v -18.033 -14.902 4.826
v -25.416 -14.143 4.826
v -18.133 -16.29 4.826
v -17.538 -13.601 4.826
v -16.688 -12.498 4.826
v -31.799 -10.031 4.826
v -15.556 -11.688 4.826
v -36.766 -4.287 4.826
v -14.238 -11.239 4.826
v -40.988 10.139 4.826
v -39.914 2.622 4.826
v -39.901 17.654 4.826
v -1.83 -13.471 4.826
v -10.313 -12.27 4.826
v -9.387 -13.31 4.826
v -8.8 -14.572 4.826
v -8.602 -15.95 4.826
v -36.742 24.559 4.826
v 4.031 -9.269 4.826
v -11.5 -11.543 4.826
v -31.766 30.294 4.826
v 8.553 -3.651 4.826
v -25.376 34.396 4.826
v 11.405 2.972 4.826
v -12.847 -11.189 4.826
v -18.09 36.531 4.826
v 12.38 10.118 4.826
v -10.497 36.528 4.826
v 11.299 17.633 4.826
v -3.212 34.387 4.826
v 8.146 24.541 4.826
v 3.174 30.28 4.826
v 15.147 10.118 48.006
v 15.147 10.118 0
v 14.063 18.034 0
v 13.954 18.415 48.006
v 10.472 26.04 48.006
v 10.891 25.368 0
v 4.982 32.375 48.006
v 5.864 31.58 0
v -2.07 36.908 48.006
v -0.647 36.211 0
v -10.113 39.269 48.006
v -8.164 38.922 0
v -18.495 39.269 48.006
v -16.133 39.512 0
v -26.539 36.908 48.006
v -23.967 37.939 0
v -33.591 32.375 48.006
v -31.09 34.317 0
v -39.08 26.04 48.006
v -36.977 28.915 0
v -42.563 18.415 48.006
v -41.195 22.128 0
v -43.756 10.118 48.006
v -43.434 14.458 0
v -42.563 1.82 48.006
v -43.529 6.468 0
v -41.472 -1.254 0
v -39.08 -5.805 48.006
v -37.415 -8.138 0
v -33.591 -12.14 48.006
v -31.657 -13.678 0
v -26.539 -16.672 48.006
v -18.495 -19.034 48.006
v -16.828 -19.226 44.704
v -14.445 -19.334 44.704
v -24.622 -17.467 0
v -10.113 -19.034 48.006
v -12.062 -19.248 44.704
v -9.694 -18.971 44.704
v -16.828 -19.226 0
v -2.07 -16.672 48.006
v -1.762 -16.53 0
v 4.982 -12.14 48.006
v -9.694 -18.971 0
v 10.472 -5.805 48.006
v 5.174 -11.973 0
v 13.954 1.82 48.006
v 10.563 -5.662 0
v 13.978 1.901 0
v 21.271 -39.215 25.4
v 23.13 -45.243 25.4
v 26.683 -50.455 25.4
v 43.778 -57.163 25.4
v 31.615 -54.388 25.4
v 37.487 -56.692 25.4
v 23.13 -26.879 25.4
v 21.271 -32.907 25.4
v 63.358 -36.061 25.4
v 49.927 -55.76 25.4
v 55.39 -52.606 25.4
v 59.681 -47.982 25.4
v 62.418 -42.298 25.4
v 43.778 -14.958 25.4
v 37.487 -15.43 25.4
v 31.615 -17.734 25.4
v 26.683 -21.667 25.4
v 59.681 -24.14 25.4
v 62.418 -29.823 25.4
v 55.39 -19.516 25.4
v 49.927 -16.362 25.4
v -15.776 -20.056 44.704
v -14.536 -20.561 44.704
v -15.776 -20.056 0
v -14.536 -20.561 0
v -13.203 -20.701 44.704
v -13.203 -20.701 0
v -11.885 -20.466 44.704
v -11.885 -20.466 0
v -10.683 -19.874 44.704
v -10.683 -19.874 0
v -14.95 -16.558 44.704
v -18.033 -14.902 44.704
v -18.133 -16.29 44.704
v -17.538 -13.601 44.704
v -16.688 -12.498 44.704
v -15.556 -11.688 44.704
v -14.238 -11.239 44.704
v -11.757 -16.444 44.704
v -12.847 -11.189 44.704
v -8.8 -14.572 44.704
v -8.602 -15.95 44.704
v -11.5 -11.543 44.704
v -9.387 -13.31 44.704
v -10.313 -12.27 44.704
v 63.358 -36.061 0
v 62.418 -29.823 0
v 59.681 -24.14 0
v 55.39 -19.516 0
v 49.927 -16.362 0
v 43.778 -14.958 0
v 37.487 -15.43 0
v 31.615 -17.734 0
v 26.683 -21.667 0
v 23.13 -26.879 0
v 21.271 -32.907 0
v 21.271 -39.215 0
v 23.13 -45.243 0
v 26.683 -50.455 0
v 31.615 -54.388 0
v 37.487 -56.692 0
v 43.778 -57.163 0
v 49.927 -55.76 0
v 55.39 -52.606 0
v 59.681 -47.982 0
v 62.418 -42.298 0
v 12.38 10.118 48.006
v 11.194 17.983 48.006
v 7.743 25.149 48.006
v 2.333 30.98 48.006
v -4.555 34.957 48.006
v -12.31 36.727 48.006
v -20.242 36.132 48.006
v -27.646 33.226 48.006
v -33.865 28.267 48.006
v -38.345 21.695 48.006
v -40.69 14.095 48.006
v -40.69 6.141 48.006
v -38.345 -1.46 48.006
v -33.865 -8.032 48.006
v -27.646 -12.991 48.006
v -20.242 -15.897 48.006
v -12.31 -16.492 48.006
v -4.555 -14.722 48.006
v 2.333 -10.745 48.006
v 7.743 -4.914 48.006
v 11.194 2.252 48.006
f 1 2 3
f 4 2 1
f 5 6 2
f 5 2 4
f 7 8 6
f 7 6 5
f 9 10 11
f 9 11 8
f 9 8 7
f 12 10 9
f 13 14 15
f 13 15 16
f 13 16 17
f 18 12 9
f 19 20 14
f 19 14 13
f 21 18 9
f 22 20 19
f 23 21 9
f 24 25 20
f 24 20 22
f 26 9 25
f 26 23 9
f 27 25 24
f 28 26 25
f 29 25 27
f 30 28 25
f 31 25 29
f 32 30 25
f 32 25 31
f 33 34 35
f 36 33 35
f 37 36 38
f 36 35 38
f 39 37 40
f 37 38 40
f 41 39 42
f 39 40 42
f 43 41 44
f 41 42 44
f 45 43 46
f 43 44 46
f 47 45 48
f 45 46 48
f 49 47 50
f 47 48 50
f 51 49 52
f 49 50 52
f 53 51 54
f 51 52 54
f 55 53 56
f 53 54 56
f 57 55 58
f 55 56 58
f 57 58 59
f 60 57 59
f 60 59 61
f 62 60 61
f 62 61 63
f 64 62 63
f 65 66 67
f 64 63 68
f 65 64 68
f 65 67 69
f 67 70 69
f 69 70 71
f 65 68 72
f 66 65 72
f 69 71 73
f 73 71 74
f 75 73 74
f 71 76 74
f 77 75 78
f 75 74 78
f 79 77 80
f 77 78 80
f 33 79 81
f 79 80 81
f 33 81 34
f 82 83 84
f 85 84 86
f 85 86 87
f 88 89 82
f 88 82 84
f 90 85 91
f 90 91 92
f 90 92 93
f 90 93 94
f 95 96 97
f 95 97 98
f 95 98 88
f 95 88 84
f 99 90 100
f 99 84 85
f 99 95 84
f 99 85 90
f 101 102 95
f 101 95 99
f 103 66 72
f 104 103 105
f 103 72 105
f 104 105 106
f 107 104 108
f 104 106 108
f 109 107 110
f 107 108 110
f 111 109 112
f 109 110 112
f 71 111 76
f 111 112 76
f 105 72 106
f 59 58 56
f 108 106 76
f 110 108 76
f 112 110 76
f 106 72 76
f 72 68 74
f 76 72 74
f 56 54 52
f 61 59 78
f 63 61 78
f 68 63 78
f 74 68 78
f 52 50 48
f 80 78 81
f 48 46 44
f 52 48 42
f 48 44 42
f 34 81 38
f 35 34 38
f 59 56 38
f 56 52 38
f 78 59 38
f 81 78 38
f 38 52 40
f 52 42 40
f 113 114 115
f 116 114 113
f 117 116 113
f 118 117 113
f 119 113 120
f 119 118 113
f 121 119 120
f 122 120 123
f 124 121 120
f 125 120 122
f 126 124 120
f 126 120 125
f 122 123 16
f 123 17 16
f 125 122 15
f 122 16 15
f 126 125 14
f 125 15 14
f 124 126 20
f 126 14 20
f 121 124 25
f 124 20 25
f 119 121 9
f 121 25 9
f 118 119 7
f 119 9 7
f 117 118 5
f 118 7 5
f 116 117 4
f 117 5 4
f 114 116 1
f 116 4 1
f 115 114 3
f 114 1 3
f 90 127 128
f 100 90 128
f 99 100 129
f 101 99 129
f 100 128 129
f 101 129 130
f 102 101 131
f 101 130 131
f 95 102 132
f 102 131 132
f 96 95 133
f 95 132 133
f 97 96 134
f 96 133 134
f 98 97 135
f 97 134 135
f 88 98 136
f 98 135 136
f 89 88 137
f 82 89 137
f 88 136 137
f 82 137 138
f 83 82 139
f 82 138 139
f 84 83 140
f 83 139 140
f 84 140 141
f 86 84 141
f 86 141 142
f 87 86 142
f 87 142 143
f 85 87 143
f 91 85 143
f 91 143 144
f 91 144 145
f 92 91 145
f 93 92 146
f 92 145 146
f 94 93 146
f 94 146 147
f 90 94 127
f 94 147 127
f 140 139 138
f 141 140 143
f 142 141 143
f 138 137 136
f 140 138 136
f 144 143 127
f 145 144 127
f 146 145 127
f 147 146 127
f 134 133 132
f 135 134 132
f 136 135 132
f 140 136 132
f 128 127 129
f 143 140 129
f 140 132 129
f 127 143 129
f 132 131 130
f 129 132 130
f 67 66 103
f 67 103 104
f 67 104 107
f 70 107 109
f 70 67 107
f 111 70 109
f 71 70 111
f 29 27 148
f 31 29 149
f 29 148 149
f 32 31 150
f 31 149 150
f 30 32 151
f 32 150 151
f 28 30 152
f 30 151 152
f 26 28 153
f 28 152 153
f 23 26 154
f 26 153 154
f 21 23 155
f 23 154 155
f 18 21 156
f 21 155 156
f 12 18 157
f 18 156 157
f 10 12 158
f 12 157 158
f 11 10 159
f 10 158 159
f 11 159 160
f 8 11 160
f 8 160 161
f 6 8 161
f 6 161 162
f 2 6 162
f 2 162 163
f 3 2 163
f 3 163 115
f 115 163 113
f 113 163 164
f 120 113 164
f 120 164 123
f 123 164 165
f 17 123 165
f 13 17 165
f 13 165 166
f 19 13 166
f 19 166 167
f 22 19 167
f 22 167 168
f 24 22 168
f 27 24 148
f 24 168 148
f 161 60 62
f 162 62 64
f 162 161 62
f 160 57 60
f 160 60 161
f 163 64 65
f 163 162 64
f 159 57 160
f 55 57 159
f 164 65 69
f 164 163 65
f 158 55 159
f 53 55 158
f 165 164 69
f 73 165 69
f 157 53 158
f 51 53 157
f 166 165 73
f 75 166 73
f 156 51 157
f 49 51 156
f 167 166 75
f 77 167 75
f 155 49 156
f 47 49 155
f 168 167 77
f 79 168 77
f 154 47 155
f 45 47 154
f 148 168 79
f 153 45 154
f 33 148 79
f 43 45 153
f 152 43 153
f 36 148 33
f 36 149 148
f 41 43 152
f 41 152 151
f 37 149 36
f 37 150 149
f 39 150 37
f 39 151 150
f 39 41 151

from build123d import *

# Parameters (mm, degrees)
F0_R      = 29.451456
F1_DEPTH  = 48.006
F2_R      = 26.683746
F3_DEPTH  = 43.18
F5_R      = 4.77229
F6_DEPTH  = 44.704
F4_R      = 21.661849
F7_DEPTH  = 25.4
F8_R      = 56.122028
F9_DEPTH  = 44.45
F10_R     = 21.161819
F11_DEPTH = 25.4


with BuildPart() as f1:
    # F0 (on Top) → F1 (new body)
    with BuildSketch(Plane.XY):
        with Locations((-14.304114, 10.117544)):
            Circle(F0_R)
    extrude(amount=F1_DEPTH)

    # F2 (on face) → F3 (cut)
    with BuildSketch(Plane.XY.offset(48.006)):
        with Locations((-14.304114, 10.117544)):
            Circle(F2_R)
    extrude(amount=-F3_DEPTH, mode=Mode.SUBTRACT)

    # F5 (on Top) → F6 (join)
    with BuildSketch(Plane.XY):
        with Locations((-13.373765, -15.932225)):
            Circle(F5_R)
    extrude(amount=F6_DEPTH)

    # F4 (on face) → F7 (join)
    with BuildSketch(Plane(origin=(0, 0, 0), x_dir=(1, 0, 0), z_dir=(0, 0, -1))):
        with Locations((-14.304114, -10.117544)):
            Circle(F4_R)
    extrude(amount=F7_DEPTH)

    # F8 (on Top) → F9 (cut)
    with BuildSketch(Plane.XY):
        with Locations((-14.900141, 8.263944)):
            Circle(F8_R)
    extrude(amount=-F9_DEPTH, mode=Mode.SUBTRACT)


with BuildPart() as f11:
    # F10 (on Top) → F11 (new body)
    with BuildSketch(Plane.XY):
        with Locations((42.196199, -36.060844)):
            Circle(F10_R)
    extrude(amount=F11_DEPTH)


solid = Compound([f1.part, f11.part])
